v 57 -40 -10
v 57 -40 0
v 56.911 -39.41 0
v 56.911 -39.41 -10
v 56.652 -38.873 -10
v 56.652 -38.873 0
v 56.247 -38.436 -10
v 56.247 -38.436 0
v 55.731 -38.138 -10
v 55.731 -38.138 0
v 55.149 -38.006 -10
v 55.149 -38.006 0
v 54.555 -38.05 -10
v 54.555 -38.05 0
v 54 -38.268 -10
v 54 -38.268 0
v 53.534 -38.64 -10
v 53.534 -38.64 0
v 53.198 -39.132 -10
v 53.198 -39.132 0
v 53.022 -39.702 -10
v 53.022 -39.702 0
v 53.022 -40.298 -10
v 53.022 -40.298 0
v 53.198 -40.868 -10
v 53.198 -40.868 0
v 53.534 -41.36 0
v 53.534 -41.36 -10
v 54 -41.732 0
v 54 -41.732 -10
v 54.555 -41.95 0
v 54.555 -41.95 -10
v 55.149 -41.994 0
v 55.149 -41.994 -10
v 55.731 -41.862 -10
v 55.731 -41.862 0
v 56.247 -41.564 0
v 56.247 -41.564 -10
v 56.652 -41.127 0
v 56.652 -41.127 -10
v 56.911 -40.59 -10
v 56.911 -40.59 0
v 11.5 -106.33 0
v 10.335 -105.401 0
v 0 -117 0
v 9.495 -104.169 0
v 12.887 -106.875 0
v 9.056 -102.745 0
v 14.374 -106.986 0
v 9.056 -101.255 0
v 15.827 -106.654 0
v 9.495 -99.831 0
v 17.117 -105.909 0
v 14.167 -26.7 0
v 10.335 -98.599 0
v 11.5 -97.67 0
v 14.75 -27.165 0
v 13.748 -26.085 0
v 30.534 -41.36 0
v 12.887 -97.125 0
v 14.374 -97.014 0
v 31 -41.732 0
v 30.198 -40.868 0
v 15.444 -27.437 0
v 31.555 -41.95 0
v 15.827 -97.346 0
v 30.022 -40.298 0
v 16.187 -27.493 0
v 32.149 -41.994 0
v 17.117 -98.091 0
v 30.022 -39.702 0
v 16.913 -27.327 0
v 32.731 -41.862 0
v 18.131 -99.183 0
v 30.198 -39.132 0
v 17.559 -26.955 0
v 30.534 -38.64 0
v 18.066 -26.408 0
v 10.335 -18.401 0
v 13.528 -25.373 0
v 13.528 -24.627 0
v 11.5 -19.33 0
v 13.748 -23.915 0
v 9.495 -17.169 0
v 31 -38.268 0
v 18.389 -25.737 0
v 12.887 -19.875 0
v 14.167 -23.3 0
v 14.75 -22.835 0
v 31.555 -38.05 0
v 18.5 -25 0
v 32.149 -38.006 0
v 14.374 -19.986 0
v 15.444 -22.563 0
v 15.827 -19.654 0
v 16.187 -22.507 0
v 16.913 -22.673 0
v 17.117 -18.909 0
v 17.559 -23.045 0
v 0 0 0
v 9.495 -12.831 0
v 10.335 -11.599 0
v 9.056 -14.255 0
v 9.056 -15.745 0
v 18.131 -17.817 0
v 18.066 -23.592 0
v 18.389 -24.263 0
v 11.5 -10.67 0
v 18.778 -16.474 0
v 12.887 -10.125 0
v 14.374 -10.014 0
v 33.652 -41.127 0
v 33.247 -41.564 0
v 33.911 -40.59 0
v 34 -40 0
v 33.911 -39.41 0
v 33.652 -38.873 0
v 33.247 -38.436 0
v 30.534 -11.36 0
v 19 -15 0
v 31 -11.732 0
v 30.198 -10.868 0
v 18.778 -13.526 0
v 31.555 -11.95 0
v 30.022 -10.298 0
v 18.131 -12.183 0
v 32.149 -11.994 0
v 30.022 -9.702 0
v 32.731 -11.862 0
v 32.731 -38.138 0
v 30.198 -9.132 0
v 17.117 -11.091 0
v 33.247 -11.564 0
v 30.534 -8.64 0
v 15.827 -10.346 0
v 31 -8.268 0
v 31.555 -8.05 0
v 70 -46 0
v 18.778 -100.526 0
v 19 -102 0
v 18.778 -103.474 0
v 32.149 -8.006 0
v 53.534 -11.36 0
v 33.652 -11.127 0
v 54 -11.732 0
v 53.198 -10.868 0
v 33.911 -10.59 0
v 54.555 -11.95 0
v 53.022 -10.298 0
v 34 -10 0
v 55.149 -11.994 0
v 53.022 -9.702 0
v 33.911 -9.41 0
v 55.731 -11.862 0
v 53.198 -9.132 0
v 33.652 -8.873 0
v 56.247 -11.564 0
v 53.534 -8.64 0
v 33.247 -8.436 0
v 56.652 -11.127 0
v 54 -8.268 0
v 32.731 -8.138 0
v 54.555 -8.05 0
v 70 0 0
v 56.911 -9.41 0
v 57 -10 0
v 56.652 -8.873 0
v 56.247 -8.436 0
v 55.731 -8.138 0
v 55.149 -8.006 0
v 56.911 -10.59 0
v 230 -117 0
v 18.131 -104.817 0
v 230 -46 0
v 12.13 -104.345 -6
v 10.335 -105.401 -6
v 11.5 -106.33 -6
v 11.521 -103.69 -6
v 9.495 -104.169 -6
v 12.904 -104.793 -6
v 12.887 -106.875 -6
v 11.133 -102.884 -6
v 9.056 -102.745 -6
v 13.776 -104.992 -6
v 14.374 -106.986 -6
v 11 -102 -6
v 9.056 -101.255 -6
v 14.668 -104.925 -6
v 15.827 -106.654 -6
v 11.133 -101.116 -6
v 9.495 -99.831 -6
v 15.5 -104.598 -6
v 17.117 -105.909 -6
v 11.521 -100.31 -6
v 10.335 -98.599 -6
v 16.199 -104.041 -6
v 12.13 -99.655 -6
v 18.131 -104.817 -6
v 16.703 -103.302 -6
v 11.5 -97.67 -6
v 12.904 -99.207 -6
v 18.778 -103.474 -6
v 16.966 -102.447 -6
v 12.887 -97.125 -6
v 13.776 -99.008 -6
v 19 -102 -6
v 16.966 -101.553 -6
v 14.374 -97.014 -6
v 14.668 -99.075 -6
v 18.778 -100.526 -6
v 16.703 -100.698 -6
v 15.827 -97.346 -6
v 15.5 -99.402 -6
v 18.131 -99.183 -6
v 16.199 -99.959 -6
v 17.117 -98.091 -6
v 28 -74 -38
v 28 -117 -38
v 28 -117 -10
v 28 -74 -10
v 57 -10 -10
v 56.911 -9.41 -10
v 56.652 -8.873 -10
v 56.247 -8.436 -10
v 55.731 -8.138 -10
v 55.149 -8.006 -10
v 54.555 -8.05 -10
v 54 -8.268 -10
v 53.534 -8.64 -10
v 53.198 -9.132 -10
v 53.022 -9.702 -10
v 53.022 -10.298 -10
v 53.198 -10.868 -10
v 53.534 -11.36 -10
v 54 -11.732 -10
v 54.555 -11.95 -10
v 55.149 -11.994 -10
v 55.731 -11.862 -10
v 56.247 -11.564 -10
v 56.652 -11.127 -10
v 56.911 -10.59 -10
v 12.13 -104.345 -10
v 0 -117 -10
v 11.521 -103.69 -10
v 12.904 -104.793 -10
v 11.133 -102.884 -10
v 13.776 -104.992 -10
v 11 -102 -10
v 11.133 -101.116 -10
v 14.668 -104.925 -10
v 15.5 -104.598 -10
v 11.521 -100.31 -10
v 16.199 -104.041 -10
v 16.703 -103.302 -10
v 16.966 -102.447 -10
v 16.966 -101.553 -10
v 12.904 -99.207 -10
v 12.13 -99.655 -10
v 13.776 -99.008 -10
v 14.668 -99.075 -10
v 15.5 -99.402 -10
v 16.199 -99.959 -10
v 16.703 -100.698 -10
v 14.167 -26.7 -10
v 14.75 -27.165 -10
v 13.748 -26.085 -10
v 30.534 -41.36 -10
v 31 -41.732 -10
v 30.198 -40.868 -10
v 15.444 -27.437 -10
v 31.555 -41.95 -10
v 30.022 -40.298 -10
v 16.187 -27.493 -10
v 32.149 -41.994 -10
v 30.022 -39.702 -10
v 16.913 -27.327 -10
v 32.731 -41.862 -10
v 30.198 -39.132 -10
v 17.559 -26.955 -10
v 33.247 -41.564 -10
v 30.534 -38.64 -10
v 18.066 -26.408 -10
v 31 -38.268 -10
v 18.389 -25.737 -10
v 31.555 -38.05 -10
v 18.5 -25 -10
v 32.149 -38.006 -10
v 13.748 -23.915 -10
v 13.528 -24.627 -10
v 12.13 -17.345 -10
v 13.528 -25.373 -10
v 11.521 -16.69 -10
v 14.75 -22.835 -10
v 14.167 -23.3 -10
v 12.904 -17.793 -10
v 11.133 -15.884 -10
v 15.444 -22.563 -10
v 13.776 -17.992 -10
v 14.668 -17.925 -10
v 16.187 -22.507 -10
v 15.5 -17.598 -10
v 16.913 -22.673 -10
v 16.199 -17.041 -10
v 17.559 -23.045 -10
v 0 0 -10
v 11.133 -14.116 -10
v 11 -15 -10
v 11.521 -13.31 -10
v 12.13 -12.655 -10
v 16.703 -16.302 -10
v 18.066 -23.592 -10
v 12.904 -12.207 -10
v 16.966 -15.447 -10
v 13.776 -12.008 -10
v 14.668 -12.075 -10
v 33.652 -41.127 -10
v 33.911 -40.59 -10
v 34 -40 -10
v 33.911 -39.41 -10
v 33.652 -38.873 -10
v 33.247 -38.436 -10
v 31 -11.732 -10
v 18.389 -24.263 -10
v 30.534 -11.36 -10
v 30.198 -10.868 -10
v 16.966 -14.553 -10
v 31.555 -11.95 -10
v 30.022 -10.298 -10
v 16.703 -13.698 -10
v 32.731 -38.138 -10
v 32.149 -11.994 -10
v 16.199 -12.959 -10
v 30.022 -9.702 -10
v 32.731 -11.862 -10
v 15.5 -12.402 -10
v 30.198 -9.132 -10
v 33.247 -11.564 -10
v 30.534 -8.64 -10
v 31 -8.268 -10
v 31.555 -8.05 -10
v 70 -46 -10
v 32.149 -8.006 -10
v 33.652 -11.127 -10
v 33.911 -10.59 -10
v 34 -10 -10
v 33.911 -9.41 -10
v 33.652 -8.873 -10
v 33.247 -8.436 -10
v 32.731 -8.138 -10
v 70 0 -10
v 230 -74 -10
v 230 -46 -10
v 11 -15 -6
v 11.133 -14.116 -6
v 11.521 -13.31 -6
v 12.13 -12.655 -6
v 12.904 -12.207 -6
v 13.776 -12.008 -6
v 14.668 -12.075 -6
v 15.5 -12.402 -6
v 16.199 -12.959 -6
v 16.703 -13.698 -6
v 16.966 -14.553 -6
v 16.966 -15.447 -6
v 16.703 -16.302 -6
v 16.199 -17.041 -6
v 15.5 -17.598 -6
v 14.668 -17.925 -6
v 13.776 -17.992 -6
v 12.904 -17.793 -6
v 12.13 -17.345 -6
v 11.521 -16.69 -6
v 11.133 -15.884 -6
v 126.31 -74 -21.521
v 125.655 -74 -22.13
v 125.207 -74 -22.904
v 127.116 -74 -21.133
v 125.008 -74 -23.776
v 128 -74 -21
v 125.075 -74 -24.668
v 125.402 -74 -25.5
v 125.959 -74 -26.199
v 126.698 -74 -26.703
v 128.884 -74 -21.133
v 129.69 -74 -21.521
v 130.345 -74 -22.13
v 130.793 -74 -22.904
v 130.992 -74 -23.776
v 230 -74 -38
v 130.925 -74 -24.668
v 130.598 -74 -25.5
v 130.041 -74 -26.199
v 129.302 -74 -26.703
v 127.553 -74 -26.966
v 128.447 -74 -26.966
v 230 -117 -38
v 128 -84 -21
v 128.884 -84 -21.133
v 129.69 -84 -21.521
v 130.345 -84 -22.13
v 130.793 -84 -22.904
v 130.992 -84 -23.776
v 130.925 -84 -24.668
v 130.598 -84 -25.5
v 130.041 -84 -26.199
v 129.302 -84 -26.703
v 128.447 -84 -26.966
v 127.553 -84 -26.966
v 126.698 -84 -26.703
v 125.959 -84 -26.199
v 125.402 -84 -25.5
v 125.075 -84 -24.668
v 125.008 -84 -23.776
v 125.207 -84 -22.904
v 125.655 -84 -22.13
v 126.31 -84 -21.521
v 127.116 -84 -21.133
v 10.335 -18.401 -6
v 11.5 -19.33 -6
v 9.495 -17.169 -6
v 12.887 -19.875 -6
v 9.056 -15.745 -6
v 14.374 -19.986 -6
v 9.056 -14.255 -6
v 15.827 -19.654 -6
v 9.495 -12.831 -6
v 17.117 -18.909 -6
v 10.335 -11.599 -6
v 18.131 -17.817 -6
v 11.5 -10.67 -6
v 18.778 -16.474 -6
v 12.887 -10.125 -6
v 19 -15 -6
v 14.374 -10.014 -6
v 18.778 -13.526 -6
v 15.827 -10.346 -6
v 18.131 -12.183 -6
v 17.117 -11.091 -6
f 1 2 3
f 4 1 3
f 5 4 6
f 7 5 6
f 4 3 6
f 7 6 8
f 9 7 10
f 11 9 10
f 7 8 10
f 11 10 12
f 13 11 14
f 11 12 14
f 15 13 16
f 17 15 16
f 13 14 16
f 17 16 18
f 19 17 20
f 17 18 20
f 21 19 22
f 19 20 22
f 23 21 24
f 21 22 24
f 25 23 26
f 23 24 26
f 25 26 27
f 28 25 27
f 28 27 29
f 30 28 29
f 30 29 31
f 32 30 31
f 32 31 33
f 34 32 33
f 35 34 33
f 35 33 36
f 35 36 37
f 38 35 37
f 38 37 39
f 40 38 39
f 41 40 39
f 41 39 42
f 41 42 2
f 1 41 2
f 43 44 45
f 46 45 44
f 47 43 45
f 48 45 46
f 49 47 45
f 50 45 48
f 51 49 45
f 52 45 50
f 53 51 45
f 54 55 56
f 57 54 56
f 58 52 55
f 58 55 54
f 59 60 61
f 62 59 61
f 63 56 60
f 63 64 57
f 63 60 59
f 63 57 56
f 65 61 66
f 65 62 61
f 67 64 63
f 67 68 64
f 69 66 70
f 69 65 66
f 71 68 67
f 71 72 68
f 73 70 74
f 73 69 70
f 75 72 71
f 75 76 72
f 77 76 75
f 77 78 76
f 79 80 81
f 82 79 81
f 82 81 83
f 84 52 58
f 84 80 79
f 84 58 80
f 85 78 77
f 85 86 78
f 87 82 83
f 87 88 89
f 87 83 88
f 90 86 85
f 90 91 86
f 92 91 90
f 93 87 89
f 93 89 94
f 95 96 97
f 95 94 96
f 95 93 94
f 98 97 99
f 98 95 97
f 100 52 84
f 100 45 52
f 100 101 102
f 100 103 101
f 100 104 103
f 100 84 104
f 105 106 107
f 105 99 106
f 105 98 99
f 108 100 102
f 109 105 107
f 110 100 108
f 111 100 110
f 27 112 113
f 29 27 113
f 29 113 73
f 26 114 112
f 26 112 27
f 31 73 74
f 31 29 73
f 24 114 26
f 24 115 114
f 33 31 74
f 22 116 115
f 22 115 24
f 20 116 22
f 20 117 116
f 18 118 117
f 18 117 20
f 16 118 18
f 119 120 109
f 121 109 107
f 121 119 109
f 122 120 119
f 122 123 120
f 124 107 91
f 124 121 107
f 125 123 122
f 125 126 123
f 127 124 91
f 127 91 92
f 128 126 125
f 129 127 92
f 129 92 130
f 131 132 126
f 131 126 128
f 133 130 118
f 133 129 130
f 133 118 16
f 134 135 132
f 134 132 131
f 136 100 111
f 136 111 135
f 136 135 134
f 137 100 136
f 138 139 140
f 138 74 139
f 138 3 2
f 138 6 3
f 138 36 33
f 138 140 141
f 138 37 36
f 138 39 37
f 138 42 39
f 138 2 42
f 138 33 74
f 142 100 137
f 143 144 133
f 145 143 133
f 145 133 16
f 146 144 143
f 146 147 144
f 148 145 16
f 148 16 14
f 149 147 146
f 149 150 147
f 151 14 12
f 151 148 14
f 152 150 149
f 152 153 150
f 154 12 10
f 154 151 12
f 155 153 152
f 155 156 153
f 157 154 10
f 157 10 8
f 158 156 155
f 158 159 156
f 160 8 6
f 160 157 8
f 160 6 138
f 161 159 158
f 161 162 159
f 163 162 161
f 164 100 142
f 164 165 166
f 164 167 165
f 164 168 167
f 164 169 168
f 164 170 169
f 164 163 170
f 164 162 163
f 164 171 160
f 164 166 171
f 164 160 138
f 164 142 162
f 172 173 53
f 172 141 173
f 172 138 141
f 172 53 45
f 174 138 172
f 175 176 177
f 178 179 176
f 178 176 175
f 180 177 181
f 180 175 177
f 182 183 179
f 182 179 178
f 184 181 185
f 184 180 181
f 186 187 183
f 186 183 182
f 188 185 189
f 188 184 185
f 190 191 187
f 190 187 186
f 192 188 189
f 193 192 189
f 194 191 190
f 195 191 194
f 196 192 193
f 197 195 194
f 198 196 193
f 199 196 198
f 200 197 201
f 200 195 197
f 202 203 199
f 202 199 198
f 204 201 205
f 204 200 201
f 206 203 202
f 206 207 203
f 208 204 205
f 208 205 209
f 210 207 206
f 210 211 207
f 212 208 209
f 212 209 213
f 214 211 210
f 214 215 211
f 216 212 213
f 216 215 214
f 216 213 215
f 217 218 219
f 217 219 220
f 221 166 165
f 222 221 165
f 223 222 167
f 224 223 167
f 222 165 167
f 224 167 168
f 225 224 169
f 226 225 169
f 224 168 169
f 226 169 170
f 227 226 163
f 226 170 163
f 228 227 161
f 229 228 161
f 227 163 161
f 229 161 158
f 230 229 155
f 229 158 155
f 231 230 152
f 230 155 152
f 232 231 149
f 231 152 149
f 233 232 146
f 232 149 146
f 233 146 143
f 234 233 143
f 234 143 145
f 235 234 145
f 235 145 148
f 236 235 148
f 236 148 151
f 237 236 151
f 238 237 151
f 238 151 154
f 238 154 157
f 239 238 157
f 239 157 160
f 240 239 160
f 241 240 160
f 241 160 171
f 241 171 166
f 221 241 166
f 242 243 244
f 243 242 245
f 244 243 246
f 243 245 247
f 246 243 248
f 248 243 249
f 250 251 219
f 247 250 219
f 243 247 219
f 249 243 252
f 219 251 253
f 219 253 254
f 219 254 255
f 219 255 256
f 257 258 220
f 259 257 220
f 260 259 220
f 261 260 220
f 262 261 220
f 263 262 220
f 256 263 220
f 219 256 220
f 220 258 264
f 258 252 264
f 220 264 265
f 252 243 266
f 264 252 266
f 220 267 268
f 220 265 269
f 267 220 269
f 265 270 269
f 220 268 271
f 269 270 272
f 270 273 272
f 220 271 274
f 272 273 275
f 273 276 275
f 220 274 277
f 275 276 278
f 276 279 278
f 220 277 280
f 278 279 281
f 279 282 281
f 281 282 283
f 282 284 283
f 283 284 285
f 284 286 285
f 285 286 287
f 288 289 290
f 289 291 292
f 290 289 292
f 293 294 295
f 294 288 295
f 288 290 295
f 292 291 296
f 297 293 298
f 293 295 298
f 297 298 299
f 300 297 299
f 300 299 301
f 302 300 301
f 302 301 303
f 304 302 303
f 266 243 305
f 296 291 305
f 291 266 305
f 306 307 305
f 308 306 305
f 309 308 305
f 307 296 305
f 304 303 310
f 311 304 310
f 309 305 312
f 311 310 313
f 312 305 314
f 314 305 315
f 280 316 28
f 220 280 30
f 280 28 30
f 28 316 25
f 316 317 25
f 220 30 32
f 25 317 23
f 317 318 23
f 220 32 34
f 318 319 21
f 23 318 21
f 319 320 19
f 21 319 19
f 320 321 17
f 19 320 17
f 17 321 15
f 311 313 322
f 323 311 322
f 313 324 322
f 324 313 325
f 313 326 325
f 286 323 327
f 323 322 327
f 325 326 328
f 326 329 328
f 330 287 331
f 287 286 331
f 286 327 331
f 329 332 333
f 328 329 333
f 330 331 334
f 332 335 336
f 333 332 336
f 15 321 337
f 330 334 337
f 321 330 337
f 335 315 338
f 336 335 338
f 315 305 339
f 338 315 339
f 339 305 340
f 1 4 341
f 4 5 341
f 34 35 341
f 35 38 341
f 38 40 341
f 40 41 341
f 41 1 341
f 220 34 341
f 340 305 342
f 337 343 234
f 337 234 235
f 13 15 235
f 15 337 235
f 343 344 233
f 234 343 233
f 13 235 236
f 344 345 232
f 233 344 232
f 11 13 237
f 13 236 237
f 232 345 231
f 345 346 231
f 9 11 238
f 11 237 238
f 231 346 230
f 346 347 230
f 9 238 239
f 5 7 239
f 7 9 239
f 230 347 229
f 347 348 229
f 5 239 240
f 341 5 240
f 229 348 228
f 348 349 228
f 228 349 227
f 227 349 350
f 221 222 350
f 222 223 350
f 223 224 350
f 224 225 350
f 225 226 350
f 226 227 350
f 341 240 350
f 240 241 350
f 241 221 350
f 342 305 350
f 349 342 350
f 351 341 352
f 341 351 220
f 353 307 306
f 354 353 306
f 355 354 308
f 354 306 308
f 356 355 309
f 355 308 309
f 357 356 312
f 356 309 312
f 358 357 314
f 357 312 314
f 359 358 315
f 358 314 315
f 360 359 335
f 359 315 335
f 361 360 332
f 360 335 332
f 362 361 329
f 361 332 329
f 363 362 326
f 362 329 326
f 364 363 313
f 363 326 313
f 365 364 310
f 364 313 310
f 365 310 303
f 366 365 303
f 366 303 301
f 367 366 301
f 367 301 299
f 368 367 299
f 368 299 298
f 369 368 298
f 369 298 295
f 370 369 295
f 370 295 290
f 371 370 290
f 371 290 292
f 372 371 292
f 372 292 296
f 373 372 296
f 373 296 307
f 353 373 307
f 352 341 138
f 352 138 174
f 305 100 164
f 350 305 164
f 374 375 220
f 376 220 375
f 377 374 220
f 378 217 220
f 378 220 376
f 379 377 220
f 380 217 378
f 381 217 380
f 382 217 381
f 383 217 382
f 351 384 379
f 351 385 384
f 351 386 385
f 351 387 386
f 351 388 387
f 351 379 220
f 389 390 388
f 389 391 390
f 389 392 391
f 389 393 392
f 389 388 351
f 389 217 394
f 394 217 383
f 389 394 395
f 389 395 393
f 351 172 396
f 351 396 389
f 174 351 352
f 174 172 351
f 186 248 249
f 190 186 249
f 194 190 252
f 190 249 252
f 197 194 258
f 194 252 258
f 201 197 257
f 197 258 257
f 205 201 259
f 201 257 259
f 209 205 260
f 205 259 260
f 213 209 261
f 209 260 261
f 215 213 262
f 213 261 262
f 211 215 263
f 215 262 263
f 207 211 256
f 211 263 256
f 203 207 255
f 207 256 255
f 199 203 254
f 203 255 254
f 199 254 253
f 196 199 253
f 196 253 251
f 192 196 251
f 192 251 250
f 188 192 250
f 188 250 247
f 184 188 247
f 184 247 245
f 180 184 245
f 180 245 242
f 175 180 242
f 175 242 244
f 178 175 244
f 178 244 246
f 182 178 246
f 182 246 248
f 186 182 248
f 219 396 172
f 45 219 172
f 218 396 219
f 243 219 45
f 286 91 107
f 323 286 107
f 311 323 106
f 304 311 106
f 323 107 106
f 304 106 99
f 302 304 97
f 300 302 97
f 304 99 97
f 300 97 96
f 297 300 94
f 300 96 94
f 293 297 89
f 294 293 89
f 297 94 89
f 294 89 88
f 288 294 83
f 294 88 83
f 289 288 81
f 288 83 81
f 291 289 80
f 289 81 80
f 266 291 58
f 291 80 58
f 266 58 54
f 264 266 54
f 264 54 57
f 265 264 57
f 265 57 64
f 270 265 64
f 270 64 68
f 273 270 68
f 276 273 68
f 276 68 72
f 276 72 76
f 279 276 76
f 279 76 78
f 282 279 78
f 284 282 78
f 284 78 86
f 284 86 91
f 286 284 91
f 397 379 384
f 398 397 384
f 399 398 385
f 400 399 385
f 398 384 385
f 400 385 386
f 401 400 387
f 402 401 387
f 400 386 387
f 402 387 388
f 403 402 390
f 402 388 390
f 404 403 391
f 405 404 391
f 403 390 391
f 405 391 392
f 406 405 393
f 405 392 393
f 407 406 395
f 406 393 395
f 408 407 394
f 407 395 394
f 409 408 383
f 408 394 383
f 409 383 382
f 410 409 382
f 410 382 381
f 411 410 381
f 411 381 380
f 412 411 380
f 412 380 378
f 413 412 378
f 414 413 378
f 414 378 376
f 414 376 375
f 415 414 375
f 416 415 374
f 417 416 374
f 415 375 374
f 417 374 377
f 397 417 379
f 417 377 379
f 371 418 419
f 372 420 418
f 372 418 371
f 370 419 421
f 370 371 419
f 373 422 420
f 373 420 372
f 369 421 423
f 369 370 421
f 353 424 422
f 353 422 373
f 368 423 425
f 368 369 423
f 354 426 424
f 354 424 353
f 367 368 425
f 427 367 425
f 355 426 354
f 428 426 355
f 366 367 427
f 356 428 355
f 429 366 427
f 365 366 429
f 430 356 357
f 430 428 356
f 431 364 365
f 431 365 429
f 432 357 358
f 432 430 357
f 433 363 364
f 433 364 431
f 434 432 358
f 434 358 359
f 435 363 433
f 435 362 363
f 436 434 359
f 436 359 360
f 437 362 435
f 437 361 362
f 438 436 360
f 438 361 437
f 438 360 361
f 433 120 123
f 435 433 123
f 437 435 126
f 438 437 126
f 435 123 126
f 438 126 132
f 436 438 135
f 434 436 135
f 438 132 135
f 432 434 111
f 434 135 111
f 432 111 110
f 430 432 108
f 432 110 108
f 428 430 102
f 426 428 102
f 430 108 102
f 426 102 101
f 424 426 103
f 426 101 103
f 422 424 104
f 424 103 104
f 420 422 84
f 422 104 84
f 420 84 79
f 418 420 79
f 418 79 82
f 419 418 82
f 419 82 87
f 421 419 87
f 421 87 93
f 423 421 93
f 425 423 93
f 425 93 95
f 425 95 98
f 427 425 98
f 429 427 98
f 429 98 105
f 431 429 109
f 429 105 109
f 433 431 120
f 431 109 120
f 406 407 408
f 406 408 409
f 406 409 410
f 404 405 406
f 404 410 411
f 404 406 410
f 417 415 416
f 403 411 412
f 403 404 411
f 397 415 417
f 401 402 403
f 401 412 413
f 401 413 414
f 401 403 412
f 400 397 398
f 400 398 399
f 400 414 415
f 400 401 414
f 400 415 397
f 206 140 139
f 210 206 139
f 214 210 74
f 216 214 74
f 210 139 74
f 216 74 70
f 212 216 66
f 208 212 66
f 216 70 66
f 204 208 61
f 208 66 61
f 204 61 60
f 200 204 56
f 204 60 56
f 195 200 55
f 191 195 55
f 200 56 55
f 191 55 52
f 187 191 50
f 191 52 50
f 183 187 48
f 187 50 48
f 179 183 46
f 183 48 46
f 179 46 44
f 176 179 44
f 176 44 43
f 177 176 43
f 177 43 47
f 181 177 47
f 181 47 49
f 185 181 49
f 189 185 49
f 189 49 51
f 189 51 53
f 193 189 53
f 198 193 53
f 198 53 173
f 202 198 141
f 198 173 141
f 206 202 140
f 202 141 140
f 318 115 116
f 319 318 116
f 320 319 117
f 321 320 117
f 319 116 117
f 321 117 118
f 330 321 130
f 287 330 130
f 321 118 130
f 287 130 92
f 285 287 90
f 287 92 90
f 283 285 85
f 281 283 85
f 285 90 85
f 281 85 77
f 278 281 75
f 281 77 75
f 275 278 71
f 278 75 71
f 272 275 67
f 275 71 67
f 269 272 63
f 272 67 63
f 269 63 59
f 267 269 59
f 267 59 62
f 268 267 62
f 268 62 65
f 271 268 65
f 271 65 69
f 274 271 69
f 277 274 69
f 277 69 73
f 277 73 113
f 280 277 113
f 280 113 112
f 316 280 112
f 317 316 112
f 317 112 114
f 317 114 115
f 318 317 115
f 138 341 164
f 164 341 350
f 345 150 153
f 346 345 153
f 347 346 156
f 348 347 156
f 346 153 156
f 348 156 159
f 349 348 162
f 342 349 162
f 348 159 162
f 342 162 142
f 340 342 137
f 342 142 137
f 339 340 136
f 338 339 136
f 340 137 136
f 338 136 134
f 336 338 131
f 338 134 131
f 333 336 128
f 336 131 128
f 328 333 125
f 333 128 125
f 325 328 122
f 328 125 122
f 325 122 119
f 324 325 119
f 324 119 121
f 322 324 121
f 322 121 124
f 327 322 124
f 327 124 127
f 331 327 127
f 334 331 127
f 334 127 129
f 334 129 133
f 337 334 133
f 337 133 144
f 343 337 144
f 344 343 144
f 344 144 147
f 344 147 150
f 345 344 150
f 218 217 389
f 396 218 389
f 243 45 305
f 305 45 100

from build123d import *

# Parameters (mm, degrees)
SKETCH2_W           = 230
SKETCH2_H           = 120
BOSS_EXTRUDE1_DEPTH = 38
CUT_EXTRUDE1_DEPTH  = 28
SKETCH4_W           = 160
SKETCH4_H           = 46
CUT_EXTRUDE2_DEPTH  = 261.929109147
SKETCH5_R           = 3
CUT_EXTRUDE3_DEPTH  = 10
SKETCH9_W           = 276.739384021
SKETCH9_H           = 54.976414544
CUT_EXTRUDE5_DEPTH  = 263.190770242
SKETCH6_R           = 3
CUT_EXTRUDE4_DEPTH  = 260.563094449
SKETCH10_R          = 5
CUT_EXTRUDE6_DEPTH  = 6
SKETCH11_R          = 2
CUT_EXTRUDE7_DEPTH  = 261.831363145
SKETCH12_R          = 2.5
CUT_EXTRUDE8_DEPTH  = 261.831363145


with BuildPart() as part:
    # Sketch2 → Boss-Extrude1 (new body)
    with BuildSketch(Plane.XY):
        with Locations((115, -60)):
            Rectangle(SKETCH2_W, SKETCH2_H)
    extrude(amount=BOSS_EXTRUDE1_DEPTH)

    # Sketch3 → Cut-Extrude1 (cut)
    with BuildSketch(Plane.XY.offset(38)):
        Polygon((28, -120), (28, -74), (230, -74), (230, 0), (0, 0), (0, -120), align=None)
    extrude(amount=-CUT_EXTRUDE1_DEPTH, mode=Mode.SUBTRACT)

    # Sketch4 → Cut-Extrude2 (cut, through all)
    with BuildSketch(Plane.XY.offset(10)):
        with Locations((150, -23)):
            Rectangle(SKETCH4_W, SKETCH4_H)
    extrude(amount=-CUT_EXTRUDE2_DEPTH, mode=Mode.SUBTRACT)


with BuildPart() as body_2:
    # Mirror2: mirrored copy
    add(part.part.mirror(Plane(origin=(102.272727273, -73.454545455, 0), x_dir=(1, 0, 0), z_dir=(0, 0, -1))))

    # Sketch5 → Cut-Extrude3 (cut)
    with BuildSketch(Plane(origin=(0, -74, 0), x_dir=(1, 0, 0), z_dir=(0, 1, 0))):
        with Locations(Location((128, 24, 0), (0, 0, 270))):
            Circle(SKETCH5_R)
    extrude(amount=-CUT_EXTRUDE3_DEPTH, mode=Mode.SUBTRACT)

    # Sketch9 → Cut-Extrude5 (cut, through all)
    with BuildSketch(Plane(origin=(0, 0, -38), x_dir=(-1, 0, 0), z_dir=(0, 0, -1))):
        with Locations((-118.343160344, -144.488207272)):
            Rectangle(SKETCH9_W, SKETCH9_H)
    extrude(amount=-CUT_EXTRUDE5_DEPTH, mode=Mode.SUBTRACT)

    # Sketch6 → Cut-Extrude4 (cut, through all)
    with BuildSketch(Plane(origin=(0, 0, -10), x_dir=(-1, 0, 0), z_dir=(0, 0, -1))):
        with Locations((-14, -102)):
            Circle(SKETCH6_R)
        with Locations((-14, -15)):
            Circle(SKETCH6_R)
    extrude(amount=-CUT_EXTRUDE4_DEPTH, mode=Mode.SUBTRACT)

    # Sketch10 → Cut-Extrude6 (cut)
    with BuildSketch(Plane.XY):
        with Locations((14, -15)):
            Circle(SKETCH10_R)
        with Locations((14, -102)):
            Circle(SKETCH10_R)
    extrude(amount=-CUT_EXTRUDE6_DEPTH, mode=Mode.SUBTRACT)

    # Sketch11 → Cut-Extrude7 (cut, through all)
    with BuildSketch(Plane.XY):
        with Locations((55, -40)):
            Circle(SKETCH11_R)
        with Locations((55, -10)):
            Circle(SKETCH11_R)
        with Locations((32, -10)):
            Circle(SKETCH11_R)
        with Locations((32, -40)):
            Circle(SKETCH11_R)
    extrude(amount=-CUT_EXTRUDE7_DEPTH, mode=Mode.SUBTRACT)

    # Sketch12 → Cut-Extrude8 (cut, through all)
    with BuildSketch(Plane.XY):
        with Locations((16, -25)):
            Circle(SKETCH12_R)
    extrude(amount=-CUT_EXTRUDE8_DEPTH, mode=Mode.SUBTRACT)


solid = body_2.part
